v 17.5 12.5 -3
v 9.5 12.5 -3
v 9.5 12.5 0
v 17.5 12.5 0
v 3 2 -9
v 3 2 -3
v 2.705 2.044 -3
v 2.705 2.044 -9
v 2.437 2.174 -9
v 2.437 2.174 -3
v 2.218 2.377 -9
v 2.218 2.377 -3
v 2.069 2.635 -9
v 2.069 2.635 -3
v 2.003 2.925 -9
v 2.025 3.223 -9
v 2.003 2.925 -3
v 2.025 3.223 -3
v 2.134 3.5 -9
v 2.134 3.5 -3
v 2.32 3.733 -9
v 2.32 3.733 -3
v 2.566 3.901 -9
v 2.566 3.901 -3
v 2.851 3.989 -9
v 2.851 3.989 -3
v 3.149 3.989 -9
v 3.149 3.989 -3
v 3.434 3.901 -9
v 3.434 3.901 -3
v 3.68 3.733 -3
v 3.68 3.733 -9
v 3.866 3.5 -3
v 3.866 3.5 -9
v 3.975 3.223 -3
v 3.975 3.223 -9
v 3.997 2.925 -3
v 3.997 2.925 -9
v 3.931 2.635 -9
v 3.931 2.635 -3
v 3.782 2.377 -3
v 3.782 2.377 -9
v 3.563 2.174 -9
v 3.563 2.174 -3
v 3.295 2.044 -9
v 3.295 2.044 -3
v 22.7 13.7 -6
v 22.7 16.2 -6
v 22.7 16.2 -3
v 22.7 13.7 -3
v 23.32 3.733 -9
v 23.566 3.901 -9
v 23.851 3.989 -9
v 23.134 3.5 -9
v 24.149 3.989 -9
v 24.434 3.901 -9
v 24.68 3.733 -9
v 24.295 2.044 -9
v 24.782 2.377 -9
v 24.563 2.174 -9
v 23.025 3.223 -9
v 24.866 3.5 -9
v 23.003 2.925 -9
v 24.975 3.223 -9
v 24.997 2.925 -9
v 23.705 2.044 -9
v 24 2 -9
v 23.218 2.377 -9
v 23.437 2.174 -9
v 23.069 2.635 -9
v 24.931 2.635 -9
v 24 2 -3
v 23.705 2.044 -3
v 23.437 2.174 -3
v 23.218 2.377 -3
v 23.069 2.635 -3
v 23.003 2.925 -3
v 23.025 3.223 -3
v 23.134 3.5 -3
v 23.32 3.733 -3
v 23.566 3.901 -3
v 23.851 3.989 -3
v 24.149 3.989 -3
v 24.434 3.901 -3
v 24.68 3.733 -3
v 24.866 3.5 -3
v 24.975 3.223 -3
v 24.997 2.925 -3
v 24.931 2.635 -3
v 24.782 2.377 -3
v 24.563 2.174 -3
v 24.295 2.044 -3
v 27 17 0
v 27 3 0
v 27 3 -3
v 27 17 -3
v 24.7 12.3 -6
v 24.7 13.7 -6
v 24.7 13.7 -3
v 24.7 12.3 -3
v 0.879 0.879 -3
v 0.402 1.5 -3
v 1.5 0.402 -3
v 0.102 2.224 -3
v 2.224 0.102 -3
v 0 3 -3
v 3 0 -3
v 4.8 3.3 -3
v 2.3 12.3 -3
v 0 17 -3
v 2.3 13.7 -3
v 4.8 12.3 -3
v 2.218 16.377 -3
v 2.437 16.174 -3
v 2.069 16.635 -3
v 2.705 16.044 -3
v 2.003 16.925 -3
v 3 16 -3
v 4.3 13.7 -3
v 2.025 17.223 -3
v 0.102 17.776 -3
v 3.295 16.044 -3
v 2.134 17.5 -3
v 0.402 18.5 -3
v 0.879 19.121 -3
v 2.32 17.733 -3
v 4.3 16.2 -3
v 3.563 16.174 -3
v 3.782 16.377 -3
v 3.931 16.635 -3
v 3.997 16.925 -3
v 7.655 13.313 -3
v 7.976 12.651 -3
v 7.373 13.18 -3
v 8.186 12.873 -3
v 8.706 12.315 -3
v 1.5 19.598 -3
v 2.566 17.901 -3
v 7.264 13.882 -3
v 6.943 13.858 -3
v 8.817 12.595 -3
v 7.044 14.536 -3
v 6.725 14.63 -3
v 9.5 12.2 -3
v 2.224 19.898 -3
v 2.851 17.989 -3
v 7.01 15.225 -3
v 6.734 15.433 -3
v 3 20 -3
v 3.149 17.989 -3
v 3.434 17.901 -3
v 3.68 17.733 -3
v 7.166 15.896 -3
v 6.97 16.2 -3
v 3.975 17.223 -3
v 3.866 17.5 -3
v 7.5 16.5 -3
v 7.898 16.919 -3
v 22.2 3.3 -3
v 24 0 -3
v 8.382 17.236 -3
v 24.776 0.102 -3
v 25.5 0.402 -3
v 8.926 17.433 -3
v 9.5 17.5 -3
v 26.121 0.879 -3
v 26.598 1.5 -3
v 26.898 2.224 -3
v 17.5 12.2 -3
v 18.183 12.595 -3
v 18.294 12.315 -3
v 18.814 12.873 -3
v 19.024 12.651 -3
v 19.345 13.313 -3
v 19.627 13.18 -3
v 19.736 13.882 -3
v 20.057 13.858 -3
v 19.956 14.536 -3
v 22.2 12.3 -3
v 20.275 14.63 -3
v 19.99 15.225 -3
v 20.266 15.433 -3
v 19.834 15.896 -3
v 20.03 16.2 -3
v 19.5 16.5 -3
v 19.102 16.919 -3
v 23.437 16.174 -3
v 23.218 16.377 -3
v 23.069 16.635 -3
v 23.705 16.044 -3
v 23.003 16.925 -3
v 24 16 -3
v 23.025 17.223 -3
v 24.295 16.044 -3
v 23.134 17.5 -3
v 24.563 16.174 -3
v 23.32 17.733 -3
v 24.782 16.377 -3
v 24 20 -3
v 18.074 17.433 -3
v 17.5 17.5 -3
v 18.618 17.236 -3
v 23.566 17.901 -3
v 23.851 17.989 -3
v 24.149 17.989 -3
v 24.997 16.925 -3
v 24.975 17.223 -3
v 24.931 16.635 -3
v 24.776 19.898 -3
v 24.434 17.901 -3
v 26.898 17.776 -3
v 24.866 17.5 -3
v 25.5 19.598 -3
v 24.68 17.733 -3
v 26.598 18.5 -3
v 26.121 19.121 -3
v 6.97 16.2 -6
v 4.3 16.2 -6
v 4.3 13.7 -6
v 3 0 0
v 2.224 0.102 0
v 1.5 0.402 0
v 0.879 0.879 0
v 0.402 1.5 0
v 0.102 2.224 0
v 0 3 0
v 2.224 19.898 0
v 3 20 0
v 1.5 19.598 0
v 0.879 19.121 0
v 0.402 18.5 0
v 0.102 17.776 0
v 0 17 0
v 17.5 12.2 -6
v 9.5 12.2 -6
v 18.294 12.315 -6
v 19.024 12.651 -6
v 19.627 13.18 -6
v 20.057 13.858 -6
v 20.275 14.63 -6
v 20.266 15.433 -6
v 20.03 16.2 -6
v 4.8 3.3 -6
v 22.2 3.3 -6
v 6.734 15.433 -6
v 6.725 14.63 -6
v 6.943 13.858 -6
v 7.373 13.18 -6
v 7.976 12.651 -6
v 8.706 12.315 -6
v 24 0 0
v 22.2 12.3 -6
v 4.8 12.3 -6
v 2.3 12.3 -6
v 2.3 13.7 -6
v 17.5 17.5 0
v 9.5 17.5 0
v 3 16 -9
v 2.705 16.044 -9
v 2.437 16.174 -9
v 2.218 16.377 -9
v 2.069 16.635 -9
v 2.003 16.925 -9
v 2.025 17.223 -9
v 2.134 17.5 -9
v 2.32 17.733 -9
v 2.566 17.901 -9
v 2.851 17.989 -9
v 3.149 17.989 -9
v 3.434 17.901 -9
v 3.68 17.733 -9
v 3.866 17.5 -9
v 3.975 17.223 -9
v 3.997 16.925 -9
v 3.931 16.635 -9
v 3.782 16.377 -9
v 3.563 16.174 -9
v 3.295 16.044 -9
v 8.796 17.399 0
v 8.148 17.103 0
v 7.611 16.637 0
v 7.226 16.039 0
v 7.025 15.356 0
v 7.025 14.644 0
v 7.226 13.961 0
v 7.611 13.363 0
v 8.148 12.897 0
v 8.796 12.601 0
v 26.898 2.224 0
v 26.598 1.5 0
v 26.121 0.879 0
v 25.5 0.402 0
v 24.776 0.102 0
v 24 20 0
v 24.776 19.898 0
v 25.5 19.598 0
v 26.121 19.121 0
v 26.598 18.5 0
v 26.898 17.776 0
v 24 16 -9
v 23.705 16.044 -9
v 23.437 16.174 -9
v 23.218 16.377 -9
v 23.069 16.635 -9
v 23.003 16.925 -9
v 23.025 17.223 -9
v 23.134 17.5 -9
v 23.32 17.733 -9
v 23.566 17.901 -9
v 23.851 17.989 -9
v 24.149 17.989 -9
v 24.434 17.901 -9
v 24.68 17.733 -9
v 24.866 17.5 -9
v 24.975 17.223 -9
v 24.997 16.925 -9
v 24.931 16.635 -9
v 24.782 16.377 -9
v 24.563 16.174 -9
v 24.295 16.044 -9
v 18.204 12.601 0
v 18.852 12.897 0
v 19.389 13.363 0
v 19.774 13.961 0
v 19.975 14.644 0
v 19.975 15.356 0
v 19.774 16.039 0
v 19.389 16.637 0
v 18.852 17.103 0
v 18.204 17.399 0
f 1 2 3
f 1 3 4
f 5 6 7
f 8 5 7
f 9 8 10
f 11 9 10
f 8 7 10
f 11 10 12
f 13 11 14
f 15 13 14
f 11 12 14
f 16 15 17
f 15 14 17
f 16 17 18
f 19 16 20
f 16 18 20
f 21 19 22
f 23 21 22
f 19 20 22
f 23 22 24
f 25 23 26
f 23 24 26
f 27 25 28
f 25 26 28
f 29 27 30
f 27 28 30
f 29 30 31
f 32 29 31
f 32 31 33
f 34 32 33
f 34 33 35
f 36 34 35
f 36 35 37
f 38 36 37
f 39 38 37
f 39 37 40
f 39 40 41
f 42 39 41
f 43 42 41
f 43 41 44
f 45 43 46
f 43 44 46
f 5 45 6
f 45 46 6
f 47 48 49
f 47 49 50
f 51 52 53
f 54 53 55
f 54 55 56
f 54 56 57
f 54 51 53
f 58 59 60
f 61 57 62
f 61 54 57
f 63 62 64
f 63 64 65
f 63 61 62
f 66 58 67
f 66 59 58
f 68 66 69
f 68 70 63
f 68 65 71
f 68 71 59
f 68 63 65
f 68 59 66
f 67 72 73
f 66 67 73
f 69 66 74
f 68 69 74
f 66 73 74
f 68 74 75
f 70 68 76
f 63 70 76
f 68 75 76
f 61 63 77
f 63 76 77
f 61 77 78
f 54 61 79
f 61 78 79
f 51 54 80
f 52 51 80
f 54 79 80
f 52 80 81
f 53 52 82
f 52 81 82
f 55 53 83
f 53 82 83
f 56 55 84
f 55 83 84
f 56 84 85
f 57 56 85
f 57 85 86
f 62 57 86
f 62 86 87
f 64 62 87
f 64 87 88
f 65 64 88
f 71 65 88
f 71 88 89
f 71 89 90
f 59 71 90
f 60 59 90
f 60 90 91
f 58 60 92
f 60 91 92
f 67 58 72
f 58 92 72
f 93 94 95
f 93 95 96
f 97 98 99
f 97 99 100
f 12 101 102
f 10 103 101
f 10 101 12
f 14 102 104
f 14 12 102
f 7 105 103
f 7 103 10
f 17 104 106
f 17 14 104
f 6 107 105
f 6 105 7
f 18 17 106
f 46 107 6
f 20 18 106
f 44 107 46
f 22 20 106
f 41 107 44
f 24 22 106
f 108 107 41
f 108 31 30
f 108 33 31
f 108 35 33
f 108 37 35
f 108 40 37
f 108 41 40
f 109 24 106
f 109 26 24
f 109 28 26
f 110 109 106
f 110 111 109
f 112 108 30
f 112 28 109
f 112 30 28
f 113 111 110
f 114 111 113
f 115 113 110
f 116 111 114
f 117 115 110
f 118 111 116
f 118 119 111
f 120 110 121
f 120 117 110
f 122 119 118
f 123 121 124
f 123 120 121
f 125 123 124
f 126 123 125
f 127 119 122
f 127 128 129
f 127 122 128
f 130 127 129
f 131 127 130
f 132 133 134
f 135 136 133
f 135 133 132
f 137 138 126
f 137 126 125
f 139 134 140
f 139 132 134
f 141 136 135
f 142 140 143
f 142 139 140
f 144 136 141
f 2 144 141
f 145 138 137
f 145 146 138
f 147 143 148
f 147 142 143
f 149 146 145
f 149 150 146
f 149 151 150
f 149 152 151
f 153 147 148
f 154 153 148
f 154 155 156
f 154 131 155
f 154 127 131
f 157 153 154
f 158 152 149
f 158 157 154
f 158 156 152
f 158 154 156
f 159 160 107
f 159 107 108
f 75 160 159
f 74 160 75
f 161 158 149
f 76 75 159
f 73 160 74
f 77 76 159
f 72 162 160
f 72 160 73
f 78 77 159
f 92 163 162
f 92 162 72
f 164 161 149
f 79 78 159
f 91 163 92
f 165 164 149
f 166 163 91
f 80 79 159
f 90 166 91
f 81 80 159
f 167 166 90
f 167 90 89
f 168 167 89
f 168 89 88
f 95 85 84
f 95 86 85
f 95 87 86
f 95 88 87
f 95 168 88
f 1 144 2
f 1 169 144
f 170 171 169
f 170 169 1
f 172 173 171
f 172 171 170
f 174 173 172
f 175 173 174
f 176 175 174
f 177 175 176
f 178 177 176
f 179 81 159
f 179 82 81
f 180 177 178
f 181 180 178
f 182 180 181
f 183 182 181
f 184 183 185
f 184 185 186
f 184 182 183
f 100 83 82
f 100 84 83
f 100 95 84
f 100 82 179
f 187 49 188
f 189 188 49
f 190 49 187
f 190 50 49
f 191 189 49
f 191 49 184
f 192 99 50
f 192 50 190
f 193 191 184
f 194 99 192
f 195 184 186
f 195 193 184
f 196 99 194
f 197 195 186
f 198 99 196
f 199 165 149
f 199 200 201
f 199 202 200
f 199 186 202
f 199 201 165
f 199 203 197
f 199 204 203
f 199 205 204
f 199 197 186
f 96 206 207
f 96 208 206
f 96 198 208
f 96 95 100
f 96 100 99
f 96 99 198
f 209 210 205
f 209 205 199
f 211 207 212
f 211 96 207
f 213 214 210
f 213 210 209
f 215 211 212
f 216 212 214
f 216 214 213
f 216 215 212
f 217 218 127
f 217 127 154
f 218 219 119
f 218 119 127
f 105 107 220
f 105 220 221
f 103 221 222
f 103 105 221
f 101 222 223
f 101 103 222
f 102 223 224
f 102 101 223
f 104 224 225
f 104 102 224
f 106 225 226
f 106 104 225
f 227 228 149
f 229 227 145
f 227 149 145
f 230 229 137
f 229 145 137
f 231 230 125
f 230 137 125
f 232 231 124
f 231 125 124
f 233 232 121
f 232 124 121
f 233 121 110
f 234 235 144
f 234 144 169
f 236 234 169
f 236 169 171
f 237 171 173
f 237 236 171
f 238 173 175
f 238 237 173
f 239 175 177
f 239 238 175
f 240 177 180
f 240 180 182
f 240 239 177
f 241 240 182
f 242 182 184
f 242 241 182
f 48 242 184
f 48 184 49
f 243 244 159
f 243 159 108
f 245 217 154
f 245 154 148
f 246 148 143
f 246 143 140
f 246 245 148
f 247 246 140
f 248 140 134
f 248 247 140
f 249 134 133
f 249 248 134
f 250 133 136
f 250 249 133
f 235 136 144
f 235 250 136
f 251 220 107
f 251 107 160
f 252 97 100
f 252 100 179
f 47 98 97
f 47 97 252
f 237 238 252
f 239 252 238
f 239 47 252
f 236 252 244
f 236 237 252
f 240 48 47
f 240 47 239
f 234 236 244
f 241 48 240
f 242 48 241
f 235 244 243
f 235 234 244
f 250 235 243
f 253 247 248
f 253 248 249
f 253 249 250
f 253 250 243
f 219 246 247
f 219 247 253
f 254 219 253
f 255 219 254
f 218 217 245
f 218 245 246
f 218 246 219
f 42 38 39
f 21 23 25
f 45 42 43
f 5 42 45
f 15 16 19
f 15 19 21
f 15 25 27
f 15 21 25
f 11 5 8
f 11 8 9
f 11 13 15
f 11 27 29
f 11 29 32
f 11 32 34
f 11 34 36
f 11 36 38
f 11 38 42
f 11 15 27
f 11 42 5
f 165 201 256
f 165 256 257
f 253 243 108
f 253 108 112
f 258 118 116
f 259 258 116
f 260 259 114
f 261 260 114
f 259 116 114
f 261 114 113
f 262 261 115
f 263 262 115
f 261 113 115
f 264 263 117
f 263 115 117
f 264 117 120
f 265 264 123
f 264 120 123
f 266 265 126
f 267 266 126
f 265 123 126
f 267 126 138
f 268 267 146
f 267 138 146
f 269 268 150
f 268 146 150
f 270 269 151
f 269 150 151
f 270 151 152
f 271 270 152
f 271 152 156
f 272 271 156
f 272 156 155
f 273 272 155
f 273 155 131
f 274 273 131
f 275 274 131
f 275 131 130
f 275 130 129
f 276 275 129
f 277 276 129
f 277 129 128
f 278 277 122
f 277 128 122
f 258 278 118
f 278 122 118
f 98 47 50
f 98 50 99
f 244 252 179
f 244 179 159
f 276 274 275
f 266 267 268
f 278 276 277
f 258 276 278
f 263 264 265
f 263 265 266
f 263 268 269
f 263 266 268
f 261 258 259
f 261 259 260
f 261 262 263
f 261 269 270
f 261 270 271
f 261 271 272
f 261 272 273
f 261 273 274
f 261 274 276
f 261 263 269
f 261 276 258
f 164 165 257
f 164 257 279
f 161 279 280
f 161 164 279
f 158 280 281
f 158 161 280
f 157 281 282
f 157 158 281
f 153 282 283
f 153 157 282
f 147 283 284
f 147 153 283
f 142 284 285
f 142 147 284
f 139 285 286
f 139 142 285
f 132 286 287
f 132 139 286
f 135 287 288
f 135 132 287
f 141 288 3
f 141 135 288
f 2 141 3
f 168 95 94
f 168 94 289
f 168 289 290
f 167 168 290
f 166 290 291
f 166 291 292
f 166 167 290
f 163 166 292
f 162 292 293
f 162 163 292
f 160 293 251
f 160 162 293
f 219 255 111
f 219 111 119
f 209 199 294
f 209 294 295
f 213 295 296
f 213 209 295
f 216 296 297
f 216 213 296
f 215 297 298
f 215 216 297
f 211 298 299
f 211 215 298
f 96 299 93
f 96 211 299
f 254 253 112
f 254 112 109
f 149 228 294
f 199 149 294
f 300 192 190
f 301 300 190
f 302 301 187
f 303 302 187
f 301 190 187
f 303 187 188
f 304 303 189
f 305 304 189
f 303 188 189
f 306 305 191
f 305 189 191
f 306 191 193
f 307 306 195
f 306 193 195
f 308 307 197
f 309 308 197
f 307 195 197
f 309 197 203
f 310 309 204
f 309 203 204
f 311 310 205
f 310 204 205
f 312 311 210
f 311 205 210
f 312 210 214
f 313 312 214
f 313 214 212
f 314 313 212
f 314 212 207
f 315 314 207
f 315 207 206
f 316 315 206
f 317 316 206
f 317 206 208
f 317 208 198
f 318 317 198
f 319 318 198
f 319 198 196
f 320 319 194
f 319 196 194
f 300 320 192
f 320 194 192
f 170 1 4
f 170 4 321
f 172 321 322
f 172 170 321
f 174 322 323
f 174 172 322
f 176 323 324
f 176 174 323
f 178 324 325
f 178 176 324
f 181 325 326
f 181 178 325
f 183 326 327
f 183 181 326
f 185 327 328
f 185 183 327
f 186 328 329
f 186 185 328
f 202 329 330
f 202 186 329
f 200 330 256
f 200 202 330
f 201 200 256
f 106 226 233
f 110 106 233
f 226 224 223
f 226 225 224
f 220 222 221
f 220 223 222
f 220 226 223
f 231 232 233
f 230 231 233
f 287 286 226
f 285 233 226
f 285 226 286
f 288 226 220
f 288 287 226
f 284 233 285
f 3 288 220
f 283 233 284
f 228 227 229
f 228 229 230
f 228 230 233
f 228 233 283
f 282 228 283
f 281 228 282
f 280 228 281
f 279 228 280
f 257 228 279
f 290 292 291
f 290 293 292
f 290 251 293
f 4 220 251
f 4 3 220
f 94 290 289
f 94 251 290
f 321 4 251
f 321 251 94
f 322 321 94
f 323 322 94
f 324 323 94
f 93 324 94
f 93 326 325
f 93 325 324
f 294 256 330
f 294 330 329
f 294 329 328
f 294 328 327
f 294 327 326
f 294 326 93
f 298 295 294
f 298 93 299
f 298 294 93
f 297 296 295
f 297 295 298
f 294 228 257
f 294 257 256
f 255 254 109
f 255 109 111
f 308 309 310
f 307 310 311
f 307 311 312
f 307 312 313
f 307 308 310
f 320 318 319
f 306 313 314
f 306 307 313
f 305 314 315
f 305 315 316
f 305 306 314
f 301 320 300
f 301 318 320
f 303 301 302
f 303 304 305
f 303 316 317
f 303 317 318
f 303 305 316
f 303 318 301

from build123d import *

# Parameters (mm, degrees)
SKETCH1_W           = 27
SKETCH1_H           = 20
BOSS_EXTRUDE1_DEPTH = 50
SKETCH2_W           = 19
SKETCH2_H           = 14
BOSS_EXTRUDE2_DEPTH = 2
SKETCH3_W           = 23
SKETCH3_H           = 2
CUT_EXTRUDE1_DEPTH  = 48
SKETCH4_W           = 0.5
SKETCH4_H           = 9
SKETCH4_W_2         = 19
SKETCH4_H_2         = 0.5
BOSS_EXTRUDE3_DEPTH = 48
FILLET1_R           = 3
CUT_EXTRUDE6_REACH  = 62.241
SKETCH7_W           = 47
SKETCH7_H           = 20
BOSS_EXTRUDE5_DEPTH = 6
CUT_EXTRUDE7_REACH  = 36.132
SKETCH9_R           = 1
BOSS_EXTRUDE6_DEPTH = 6
CUT_EXTRUDE8_DEPTH  = 3


with BuildPart() as part:
    # Sketch1 → Boss-Extrude1 (new body)
    with BuildSketch(Plane.XY):
        with Locations((13.5, 10)):
            Rectangle(SKETCH1_W, SKETCH1_H)
        Polygon((4, 17), (23, 17), (23, 16), (23, 4), (23, 3), (4, 3), (4, 4), (4, 16), align=None, mode=Mode.SUBTRACT)
    extrude(amount=-BOSS_EXTRUDE1_DEPTH)

    # Sketch2 → Boss-Extrude2 (add)
    with BuildSketch(Plane(origin=(0, 0, -50), x_dir=(-1, 0, 0), z_dir=(0, 0, -1))):
        with Locations((-13.5, 10)):
            Rectangle(SKETCH2_W, SKETCH2_H)
    extrude(amount=-BOSS_EXTRUDE2_DEPTH)

    # Sketch3 → Cut-Extrude1 (cut)
    with BuildSketch(Plane.XY):
        with Locations((13.5, 13)):
            Rectangle(SKETCH3_W, SKETCH3_H)
    extrude(amount=-CUT_EXTRUDE1_DEPTH, mode=Mode.SUBTRACT)

    # Sketch4 → Boss-Extrude3 (add)
    with BuildSketch(Plane.XY):
        with Locations((4.25, 7.5)):
            Rectangle(SKETCH4_W, SKETCH4_H)
        with Locations((22.75, 7.5)):
            Rectangle(SKETCH4_W, SKETCH4_H)
        with Locations((13.5, 16.75)):
            Rectangle(SKETCH4_W_2, SKETCH4_H_2)
    extrude(amount=-BOSS_EXTRUDE3_DEPTH)

    # Fillet1
    fillet1_edges = [part.edges().sort_by_distance(p)[0] for p in [
        (0, 0, -25),
        (0, 20, -25),
        (27, 20, -25),
        (27, 0, -25),
    ]]
    fillet(fillet1_edges, radius=FILLET1_R)

    # Sketch7 → Cut-Extrude6 (cut, up to next)
    with BuildSketch(Plane(origin=(27, 0, 0), x_dir=(0, 0, -1), z_dir=(1, 0, 0)), mode=Mode.PRIVATE) as cut_extrude6_sk1:
        with Locations((26.5, 10)):
            Rectangle(SKETCH7_W, SKETCH7_H)
    cut_extrude6_tool1 = extrude(cut_extrude6_sk1.sketch, amount=-CUT_EXTRUDE6_REACH, mode=Mode.PRIVATE) & part.part
    add(cut_extrude6_tool1.solids().sort_by_distance((27, 10, -26.5))[0], mode=Mode.SUBTRACT)

    # Sketch5 → Boss-Extrude5 (add)
    with BuildSketch(Plane.XY):
        Polygon((22.5, 3), (4.5, 3), (4.5, 12), (2, 12), (2, 14), (4, 14), (4, 16.5), (23, 16.5), (23, 14), (25, 14), (25, 12), (22.5, 12), align=None)
    extrude(amount=-BOSS_EXTRUDE5_DEPTH)

    # Sketch8 → Cut-Extrude7 (cut, up to next)
    with BuildSketch(Plane(origin=(0, 0, -6), x_dir=(-1, 0, 0), z_dir=(0, 0, -1)), mode=Mode.PRIVATE) as cut_extrude7_sk1:
        with BuildLine():
            Line((-17.5, 17.5), (-9.5, 17.5))
            ThreePointArc((-9.5, 17.5), (-7, 15), (-9.5, 12.5))
            Line((-9.5, 12.5), (-17.5, 12.5))
            ThreePointArc((-17.5, 12.5), (-20, 15), (-17.5, 17.5))
        make_face()
    cut_extrude7_tool1 = extrude(cut_extrude7_sk1.sketch, amount=-CUT_EXTRUDE7_REACH, mode=Mode.PRIVATE) & part.part
    add(cut_extrude7_tool1.solids().sort_by_distance((13.5, 15, -6))[0], mode=Mode.SUBTRACT)

    # Sketch9 → Boss-Extrude6 (add)
    with BuildSketch(Plane(origin=(0, 0, -3), x_dir=(-1, 0, 0), z_dir=(0, 0, -1))):
        with Locations(Location((-24, 17, 0), (0, 0, 270))):
            Circle(SKETCH9_R)
        with Locations(Location((-3, 17, 0), (0, 0, 270))):
            Circle(SKETCH9_R)
        with Locations(Location((-3, 3, 0), (0, 0, 270))):
            Circle(SKETCH9_R)
        with Locations(Location((-24, 3, 0), (0, 0, 270))):
            Circle(SKETCH9_R)
    extrude(amount=BOSS_EXTRUDE6_DEPTH)

    # Sketch11 → Cut-Extrude8 (cut)
    with BuildSketch(Plane(origin=(0, 0, -6), x_dir=(-1, 0, 0), z_dir=(0, 0, -1))):
        with BuildLine():
            ThreePointArc((-7.5, 16.5), (-7.263932023, 13.881966011), (-9.5, 12.5))
            Line((-9.5, 12.5), (-17.5, 12.5))
            ThreePointArc((-17.5, 12.5), (-19.736067977, 13.881966011), (-19.5, 16.5))
            Line((-19.5, 16.5), (-23, 16.5))
            Line((-23, 16.5), (-23, 14))
            Line((-23, 14), (-25, 14))
            Line((-25, 14), (-25, 12))
            Line((-25, 12), (-22.5, 12))
            Line((-22.5, 12), (-22.5, 3))
            Line((-22.5, 3), (-4.5, 3))
            Line((-4.5, 3), (-4.5, 12))
            Line((-4.5, 12), (-2, 12))
            Line((-2, 12), (-2, 14))
            Line((-2, 14), (-4, 14))
            Line((-4, 14), (-4, 16.5))
            Line((-4, 16.5), (-7.5, 16.5))
        make_face()
        with BuildLine():
            Line((-20.029822128, 16.2), (-22.7, 16.2))
            Line((-22.7, 16.2), (-22.7, 13.7))
            Line((-22.7, 13.7), (-24.7, 13.7))
            Line((-24.7, 13.7), (-24.7, 12.3))
            Line((-24.7, 12.3), (-22.2, 12.3))
            Line((-22.2, 12.3), (-22.2, 3.3))
            Line((-22.2, 3.3), (-4.8, 3.3))
            Line((-4.8, 3.3), (-4.8, 12.3))
            Line((-4.8, 12.3), (-2.3, 12.3))
            Line((-2.3, 12.3), (-2.3, 13.7))
            Line((-2.3, 13.7), (-4.3, 13.7))
            Line((-4.3, 13.7), (-4.3, 16.2))
            Line((-4.3, 16.2), (-6.970177872, 16.2))
            ThreePointArc((-6.970177872, 16.2), (-7.133568087, 13.503337045), (-9.5, 12.2))
            Line((-9.5, 12.2), (-17.5, 12.2))
            ThreePointArc((-17.5, 12.2), (-19.866431913, 13.503337045), (-20.029822128, 16.2))
        make_face(mode=Mode.SUBTRACT)
    extrude(amount=-CUT_EXTRUDE8_DEPTH, mode=Mode.SUBTRACT)


solid = part.part
